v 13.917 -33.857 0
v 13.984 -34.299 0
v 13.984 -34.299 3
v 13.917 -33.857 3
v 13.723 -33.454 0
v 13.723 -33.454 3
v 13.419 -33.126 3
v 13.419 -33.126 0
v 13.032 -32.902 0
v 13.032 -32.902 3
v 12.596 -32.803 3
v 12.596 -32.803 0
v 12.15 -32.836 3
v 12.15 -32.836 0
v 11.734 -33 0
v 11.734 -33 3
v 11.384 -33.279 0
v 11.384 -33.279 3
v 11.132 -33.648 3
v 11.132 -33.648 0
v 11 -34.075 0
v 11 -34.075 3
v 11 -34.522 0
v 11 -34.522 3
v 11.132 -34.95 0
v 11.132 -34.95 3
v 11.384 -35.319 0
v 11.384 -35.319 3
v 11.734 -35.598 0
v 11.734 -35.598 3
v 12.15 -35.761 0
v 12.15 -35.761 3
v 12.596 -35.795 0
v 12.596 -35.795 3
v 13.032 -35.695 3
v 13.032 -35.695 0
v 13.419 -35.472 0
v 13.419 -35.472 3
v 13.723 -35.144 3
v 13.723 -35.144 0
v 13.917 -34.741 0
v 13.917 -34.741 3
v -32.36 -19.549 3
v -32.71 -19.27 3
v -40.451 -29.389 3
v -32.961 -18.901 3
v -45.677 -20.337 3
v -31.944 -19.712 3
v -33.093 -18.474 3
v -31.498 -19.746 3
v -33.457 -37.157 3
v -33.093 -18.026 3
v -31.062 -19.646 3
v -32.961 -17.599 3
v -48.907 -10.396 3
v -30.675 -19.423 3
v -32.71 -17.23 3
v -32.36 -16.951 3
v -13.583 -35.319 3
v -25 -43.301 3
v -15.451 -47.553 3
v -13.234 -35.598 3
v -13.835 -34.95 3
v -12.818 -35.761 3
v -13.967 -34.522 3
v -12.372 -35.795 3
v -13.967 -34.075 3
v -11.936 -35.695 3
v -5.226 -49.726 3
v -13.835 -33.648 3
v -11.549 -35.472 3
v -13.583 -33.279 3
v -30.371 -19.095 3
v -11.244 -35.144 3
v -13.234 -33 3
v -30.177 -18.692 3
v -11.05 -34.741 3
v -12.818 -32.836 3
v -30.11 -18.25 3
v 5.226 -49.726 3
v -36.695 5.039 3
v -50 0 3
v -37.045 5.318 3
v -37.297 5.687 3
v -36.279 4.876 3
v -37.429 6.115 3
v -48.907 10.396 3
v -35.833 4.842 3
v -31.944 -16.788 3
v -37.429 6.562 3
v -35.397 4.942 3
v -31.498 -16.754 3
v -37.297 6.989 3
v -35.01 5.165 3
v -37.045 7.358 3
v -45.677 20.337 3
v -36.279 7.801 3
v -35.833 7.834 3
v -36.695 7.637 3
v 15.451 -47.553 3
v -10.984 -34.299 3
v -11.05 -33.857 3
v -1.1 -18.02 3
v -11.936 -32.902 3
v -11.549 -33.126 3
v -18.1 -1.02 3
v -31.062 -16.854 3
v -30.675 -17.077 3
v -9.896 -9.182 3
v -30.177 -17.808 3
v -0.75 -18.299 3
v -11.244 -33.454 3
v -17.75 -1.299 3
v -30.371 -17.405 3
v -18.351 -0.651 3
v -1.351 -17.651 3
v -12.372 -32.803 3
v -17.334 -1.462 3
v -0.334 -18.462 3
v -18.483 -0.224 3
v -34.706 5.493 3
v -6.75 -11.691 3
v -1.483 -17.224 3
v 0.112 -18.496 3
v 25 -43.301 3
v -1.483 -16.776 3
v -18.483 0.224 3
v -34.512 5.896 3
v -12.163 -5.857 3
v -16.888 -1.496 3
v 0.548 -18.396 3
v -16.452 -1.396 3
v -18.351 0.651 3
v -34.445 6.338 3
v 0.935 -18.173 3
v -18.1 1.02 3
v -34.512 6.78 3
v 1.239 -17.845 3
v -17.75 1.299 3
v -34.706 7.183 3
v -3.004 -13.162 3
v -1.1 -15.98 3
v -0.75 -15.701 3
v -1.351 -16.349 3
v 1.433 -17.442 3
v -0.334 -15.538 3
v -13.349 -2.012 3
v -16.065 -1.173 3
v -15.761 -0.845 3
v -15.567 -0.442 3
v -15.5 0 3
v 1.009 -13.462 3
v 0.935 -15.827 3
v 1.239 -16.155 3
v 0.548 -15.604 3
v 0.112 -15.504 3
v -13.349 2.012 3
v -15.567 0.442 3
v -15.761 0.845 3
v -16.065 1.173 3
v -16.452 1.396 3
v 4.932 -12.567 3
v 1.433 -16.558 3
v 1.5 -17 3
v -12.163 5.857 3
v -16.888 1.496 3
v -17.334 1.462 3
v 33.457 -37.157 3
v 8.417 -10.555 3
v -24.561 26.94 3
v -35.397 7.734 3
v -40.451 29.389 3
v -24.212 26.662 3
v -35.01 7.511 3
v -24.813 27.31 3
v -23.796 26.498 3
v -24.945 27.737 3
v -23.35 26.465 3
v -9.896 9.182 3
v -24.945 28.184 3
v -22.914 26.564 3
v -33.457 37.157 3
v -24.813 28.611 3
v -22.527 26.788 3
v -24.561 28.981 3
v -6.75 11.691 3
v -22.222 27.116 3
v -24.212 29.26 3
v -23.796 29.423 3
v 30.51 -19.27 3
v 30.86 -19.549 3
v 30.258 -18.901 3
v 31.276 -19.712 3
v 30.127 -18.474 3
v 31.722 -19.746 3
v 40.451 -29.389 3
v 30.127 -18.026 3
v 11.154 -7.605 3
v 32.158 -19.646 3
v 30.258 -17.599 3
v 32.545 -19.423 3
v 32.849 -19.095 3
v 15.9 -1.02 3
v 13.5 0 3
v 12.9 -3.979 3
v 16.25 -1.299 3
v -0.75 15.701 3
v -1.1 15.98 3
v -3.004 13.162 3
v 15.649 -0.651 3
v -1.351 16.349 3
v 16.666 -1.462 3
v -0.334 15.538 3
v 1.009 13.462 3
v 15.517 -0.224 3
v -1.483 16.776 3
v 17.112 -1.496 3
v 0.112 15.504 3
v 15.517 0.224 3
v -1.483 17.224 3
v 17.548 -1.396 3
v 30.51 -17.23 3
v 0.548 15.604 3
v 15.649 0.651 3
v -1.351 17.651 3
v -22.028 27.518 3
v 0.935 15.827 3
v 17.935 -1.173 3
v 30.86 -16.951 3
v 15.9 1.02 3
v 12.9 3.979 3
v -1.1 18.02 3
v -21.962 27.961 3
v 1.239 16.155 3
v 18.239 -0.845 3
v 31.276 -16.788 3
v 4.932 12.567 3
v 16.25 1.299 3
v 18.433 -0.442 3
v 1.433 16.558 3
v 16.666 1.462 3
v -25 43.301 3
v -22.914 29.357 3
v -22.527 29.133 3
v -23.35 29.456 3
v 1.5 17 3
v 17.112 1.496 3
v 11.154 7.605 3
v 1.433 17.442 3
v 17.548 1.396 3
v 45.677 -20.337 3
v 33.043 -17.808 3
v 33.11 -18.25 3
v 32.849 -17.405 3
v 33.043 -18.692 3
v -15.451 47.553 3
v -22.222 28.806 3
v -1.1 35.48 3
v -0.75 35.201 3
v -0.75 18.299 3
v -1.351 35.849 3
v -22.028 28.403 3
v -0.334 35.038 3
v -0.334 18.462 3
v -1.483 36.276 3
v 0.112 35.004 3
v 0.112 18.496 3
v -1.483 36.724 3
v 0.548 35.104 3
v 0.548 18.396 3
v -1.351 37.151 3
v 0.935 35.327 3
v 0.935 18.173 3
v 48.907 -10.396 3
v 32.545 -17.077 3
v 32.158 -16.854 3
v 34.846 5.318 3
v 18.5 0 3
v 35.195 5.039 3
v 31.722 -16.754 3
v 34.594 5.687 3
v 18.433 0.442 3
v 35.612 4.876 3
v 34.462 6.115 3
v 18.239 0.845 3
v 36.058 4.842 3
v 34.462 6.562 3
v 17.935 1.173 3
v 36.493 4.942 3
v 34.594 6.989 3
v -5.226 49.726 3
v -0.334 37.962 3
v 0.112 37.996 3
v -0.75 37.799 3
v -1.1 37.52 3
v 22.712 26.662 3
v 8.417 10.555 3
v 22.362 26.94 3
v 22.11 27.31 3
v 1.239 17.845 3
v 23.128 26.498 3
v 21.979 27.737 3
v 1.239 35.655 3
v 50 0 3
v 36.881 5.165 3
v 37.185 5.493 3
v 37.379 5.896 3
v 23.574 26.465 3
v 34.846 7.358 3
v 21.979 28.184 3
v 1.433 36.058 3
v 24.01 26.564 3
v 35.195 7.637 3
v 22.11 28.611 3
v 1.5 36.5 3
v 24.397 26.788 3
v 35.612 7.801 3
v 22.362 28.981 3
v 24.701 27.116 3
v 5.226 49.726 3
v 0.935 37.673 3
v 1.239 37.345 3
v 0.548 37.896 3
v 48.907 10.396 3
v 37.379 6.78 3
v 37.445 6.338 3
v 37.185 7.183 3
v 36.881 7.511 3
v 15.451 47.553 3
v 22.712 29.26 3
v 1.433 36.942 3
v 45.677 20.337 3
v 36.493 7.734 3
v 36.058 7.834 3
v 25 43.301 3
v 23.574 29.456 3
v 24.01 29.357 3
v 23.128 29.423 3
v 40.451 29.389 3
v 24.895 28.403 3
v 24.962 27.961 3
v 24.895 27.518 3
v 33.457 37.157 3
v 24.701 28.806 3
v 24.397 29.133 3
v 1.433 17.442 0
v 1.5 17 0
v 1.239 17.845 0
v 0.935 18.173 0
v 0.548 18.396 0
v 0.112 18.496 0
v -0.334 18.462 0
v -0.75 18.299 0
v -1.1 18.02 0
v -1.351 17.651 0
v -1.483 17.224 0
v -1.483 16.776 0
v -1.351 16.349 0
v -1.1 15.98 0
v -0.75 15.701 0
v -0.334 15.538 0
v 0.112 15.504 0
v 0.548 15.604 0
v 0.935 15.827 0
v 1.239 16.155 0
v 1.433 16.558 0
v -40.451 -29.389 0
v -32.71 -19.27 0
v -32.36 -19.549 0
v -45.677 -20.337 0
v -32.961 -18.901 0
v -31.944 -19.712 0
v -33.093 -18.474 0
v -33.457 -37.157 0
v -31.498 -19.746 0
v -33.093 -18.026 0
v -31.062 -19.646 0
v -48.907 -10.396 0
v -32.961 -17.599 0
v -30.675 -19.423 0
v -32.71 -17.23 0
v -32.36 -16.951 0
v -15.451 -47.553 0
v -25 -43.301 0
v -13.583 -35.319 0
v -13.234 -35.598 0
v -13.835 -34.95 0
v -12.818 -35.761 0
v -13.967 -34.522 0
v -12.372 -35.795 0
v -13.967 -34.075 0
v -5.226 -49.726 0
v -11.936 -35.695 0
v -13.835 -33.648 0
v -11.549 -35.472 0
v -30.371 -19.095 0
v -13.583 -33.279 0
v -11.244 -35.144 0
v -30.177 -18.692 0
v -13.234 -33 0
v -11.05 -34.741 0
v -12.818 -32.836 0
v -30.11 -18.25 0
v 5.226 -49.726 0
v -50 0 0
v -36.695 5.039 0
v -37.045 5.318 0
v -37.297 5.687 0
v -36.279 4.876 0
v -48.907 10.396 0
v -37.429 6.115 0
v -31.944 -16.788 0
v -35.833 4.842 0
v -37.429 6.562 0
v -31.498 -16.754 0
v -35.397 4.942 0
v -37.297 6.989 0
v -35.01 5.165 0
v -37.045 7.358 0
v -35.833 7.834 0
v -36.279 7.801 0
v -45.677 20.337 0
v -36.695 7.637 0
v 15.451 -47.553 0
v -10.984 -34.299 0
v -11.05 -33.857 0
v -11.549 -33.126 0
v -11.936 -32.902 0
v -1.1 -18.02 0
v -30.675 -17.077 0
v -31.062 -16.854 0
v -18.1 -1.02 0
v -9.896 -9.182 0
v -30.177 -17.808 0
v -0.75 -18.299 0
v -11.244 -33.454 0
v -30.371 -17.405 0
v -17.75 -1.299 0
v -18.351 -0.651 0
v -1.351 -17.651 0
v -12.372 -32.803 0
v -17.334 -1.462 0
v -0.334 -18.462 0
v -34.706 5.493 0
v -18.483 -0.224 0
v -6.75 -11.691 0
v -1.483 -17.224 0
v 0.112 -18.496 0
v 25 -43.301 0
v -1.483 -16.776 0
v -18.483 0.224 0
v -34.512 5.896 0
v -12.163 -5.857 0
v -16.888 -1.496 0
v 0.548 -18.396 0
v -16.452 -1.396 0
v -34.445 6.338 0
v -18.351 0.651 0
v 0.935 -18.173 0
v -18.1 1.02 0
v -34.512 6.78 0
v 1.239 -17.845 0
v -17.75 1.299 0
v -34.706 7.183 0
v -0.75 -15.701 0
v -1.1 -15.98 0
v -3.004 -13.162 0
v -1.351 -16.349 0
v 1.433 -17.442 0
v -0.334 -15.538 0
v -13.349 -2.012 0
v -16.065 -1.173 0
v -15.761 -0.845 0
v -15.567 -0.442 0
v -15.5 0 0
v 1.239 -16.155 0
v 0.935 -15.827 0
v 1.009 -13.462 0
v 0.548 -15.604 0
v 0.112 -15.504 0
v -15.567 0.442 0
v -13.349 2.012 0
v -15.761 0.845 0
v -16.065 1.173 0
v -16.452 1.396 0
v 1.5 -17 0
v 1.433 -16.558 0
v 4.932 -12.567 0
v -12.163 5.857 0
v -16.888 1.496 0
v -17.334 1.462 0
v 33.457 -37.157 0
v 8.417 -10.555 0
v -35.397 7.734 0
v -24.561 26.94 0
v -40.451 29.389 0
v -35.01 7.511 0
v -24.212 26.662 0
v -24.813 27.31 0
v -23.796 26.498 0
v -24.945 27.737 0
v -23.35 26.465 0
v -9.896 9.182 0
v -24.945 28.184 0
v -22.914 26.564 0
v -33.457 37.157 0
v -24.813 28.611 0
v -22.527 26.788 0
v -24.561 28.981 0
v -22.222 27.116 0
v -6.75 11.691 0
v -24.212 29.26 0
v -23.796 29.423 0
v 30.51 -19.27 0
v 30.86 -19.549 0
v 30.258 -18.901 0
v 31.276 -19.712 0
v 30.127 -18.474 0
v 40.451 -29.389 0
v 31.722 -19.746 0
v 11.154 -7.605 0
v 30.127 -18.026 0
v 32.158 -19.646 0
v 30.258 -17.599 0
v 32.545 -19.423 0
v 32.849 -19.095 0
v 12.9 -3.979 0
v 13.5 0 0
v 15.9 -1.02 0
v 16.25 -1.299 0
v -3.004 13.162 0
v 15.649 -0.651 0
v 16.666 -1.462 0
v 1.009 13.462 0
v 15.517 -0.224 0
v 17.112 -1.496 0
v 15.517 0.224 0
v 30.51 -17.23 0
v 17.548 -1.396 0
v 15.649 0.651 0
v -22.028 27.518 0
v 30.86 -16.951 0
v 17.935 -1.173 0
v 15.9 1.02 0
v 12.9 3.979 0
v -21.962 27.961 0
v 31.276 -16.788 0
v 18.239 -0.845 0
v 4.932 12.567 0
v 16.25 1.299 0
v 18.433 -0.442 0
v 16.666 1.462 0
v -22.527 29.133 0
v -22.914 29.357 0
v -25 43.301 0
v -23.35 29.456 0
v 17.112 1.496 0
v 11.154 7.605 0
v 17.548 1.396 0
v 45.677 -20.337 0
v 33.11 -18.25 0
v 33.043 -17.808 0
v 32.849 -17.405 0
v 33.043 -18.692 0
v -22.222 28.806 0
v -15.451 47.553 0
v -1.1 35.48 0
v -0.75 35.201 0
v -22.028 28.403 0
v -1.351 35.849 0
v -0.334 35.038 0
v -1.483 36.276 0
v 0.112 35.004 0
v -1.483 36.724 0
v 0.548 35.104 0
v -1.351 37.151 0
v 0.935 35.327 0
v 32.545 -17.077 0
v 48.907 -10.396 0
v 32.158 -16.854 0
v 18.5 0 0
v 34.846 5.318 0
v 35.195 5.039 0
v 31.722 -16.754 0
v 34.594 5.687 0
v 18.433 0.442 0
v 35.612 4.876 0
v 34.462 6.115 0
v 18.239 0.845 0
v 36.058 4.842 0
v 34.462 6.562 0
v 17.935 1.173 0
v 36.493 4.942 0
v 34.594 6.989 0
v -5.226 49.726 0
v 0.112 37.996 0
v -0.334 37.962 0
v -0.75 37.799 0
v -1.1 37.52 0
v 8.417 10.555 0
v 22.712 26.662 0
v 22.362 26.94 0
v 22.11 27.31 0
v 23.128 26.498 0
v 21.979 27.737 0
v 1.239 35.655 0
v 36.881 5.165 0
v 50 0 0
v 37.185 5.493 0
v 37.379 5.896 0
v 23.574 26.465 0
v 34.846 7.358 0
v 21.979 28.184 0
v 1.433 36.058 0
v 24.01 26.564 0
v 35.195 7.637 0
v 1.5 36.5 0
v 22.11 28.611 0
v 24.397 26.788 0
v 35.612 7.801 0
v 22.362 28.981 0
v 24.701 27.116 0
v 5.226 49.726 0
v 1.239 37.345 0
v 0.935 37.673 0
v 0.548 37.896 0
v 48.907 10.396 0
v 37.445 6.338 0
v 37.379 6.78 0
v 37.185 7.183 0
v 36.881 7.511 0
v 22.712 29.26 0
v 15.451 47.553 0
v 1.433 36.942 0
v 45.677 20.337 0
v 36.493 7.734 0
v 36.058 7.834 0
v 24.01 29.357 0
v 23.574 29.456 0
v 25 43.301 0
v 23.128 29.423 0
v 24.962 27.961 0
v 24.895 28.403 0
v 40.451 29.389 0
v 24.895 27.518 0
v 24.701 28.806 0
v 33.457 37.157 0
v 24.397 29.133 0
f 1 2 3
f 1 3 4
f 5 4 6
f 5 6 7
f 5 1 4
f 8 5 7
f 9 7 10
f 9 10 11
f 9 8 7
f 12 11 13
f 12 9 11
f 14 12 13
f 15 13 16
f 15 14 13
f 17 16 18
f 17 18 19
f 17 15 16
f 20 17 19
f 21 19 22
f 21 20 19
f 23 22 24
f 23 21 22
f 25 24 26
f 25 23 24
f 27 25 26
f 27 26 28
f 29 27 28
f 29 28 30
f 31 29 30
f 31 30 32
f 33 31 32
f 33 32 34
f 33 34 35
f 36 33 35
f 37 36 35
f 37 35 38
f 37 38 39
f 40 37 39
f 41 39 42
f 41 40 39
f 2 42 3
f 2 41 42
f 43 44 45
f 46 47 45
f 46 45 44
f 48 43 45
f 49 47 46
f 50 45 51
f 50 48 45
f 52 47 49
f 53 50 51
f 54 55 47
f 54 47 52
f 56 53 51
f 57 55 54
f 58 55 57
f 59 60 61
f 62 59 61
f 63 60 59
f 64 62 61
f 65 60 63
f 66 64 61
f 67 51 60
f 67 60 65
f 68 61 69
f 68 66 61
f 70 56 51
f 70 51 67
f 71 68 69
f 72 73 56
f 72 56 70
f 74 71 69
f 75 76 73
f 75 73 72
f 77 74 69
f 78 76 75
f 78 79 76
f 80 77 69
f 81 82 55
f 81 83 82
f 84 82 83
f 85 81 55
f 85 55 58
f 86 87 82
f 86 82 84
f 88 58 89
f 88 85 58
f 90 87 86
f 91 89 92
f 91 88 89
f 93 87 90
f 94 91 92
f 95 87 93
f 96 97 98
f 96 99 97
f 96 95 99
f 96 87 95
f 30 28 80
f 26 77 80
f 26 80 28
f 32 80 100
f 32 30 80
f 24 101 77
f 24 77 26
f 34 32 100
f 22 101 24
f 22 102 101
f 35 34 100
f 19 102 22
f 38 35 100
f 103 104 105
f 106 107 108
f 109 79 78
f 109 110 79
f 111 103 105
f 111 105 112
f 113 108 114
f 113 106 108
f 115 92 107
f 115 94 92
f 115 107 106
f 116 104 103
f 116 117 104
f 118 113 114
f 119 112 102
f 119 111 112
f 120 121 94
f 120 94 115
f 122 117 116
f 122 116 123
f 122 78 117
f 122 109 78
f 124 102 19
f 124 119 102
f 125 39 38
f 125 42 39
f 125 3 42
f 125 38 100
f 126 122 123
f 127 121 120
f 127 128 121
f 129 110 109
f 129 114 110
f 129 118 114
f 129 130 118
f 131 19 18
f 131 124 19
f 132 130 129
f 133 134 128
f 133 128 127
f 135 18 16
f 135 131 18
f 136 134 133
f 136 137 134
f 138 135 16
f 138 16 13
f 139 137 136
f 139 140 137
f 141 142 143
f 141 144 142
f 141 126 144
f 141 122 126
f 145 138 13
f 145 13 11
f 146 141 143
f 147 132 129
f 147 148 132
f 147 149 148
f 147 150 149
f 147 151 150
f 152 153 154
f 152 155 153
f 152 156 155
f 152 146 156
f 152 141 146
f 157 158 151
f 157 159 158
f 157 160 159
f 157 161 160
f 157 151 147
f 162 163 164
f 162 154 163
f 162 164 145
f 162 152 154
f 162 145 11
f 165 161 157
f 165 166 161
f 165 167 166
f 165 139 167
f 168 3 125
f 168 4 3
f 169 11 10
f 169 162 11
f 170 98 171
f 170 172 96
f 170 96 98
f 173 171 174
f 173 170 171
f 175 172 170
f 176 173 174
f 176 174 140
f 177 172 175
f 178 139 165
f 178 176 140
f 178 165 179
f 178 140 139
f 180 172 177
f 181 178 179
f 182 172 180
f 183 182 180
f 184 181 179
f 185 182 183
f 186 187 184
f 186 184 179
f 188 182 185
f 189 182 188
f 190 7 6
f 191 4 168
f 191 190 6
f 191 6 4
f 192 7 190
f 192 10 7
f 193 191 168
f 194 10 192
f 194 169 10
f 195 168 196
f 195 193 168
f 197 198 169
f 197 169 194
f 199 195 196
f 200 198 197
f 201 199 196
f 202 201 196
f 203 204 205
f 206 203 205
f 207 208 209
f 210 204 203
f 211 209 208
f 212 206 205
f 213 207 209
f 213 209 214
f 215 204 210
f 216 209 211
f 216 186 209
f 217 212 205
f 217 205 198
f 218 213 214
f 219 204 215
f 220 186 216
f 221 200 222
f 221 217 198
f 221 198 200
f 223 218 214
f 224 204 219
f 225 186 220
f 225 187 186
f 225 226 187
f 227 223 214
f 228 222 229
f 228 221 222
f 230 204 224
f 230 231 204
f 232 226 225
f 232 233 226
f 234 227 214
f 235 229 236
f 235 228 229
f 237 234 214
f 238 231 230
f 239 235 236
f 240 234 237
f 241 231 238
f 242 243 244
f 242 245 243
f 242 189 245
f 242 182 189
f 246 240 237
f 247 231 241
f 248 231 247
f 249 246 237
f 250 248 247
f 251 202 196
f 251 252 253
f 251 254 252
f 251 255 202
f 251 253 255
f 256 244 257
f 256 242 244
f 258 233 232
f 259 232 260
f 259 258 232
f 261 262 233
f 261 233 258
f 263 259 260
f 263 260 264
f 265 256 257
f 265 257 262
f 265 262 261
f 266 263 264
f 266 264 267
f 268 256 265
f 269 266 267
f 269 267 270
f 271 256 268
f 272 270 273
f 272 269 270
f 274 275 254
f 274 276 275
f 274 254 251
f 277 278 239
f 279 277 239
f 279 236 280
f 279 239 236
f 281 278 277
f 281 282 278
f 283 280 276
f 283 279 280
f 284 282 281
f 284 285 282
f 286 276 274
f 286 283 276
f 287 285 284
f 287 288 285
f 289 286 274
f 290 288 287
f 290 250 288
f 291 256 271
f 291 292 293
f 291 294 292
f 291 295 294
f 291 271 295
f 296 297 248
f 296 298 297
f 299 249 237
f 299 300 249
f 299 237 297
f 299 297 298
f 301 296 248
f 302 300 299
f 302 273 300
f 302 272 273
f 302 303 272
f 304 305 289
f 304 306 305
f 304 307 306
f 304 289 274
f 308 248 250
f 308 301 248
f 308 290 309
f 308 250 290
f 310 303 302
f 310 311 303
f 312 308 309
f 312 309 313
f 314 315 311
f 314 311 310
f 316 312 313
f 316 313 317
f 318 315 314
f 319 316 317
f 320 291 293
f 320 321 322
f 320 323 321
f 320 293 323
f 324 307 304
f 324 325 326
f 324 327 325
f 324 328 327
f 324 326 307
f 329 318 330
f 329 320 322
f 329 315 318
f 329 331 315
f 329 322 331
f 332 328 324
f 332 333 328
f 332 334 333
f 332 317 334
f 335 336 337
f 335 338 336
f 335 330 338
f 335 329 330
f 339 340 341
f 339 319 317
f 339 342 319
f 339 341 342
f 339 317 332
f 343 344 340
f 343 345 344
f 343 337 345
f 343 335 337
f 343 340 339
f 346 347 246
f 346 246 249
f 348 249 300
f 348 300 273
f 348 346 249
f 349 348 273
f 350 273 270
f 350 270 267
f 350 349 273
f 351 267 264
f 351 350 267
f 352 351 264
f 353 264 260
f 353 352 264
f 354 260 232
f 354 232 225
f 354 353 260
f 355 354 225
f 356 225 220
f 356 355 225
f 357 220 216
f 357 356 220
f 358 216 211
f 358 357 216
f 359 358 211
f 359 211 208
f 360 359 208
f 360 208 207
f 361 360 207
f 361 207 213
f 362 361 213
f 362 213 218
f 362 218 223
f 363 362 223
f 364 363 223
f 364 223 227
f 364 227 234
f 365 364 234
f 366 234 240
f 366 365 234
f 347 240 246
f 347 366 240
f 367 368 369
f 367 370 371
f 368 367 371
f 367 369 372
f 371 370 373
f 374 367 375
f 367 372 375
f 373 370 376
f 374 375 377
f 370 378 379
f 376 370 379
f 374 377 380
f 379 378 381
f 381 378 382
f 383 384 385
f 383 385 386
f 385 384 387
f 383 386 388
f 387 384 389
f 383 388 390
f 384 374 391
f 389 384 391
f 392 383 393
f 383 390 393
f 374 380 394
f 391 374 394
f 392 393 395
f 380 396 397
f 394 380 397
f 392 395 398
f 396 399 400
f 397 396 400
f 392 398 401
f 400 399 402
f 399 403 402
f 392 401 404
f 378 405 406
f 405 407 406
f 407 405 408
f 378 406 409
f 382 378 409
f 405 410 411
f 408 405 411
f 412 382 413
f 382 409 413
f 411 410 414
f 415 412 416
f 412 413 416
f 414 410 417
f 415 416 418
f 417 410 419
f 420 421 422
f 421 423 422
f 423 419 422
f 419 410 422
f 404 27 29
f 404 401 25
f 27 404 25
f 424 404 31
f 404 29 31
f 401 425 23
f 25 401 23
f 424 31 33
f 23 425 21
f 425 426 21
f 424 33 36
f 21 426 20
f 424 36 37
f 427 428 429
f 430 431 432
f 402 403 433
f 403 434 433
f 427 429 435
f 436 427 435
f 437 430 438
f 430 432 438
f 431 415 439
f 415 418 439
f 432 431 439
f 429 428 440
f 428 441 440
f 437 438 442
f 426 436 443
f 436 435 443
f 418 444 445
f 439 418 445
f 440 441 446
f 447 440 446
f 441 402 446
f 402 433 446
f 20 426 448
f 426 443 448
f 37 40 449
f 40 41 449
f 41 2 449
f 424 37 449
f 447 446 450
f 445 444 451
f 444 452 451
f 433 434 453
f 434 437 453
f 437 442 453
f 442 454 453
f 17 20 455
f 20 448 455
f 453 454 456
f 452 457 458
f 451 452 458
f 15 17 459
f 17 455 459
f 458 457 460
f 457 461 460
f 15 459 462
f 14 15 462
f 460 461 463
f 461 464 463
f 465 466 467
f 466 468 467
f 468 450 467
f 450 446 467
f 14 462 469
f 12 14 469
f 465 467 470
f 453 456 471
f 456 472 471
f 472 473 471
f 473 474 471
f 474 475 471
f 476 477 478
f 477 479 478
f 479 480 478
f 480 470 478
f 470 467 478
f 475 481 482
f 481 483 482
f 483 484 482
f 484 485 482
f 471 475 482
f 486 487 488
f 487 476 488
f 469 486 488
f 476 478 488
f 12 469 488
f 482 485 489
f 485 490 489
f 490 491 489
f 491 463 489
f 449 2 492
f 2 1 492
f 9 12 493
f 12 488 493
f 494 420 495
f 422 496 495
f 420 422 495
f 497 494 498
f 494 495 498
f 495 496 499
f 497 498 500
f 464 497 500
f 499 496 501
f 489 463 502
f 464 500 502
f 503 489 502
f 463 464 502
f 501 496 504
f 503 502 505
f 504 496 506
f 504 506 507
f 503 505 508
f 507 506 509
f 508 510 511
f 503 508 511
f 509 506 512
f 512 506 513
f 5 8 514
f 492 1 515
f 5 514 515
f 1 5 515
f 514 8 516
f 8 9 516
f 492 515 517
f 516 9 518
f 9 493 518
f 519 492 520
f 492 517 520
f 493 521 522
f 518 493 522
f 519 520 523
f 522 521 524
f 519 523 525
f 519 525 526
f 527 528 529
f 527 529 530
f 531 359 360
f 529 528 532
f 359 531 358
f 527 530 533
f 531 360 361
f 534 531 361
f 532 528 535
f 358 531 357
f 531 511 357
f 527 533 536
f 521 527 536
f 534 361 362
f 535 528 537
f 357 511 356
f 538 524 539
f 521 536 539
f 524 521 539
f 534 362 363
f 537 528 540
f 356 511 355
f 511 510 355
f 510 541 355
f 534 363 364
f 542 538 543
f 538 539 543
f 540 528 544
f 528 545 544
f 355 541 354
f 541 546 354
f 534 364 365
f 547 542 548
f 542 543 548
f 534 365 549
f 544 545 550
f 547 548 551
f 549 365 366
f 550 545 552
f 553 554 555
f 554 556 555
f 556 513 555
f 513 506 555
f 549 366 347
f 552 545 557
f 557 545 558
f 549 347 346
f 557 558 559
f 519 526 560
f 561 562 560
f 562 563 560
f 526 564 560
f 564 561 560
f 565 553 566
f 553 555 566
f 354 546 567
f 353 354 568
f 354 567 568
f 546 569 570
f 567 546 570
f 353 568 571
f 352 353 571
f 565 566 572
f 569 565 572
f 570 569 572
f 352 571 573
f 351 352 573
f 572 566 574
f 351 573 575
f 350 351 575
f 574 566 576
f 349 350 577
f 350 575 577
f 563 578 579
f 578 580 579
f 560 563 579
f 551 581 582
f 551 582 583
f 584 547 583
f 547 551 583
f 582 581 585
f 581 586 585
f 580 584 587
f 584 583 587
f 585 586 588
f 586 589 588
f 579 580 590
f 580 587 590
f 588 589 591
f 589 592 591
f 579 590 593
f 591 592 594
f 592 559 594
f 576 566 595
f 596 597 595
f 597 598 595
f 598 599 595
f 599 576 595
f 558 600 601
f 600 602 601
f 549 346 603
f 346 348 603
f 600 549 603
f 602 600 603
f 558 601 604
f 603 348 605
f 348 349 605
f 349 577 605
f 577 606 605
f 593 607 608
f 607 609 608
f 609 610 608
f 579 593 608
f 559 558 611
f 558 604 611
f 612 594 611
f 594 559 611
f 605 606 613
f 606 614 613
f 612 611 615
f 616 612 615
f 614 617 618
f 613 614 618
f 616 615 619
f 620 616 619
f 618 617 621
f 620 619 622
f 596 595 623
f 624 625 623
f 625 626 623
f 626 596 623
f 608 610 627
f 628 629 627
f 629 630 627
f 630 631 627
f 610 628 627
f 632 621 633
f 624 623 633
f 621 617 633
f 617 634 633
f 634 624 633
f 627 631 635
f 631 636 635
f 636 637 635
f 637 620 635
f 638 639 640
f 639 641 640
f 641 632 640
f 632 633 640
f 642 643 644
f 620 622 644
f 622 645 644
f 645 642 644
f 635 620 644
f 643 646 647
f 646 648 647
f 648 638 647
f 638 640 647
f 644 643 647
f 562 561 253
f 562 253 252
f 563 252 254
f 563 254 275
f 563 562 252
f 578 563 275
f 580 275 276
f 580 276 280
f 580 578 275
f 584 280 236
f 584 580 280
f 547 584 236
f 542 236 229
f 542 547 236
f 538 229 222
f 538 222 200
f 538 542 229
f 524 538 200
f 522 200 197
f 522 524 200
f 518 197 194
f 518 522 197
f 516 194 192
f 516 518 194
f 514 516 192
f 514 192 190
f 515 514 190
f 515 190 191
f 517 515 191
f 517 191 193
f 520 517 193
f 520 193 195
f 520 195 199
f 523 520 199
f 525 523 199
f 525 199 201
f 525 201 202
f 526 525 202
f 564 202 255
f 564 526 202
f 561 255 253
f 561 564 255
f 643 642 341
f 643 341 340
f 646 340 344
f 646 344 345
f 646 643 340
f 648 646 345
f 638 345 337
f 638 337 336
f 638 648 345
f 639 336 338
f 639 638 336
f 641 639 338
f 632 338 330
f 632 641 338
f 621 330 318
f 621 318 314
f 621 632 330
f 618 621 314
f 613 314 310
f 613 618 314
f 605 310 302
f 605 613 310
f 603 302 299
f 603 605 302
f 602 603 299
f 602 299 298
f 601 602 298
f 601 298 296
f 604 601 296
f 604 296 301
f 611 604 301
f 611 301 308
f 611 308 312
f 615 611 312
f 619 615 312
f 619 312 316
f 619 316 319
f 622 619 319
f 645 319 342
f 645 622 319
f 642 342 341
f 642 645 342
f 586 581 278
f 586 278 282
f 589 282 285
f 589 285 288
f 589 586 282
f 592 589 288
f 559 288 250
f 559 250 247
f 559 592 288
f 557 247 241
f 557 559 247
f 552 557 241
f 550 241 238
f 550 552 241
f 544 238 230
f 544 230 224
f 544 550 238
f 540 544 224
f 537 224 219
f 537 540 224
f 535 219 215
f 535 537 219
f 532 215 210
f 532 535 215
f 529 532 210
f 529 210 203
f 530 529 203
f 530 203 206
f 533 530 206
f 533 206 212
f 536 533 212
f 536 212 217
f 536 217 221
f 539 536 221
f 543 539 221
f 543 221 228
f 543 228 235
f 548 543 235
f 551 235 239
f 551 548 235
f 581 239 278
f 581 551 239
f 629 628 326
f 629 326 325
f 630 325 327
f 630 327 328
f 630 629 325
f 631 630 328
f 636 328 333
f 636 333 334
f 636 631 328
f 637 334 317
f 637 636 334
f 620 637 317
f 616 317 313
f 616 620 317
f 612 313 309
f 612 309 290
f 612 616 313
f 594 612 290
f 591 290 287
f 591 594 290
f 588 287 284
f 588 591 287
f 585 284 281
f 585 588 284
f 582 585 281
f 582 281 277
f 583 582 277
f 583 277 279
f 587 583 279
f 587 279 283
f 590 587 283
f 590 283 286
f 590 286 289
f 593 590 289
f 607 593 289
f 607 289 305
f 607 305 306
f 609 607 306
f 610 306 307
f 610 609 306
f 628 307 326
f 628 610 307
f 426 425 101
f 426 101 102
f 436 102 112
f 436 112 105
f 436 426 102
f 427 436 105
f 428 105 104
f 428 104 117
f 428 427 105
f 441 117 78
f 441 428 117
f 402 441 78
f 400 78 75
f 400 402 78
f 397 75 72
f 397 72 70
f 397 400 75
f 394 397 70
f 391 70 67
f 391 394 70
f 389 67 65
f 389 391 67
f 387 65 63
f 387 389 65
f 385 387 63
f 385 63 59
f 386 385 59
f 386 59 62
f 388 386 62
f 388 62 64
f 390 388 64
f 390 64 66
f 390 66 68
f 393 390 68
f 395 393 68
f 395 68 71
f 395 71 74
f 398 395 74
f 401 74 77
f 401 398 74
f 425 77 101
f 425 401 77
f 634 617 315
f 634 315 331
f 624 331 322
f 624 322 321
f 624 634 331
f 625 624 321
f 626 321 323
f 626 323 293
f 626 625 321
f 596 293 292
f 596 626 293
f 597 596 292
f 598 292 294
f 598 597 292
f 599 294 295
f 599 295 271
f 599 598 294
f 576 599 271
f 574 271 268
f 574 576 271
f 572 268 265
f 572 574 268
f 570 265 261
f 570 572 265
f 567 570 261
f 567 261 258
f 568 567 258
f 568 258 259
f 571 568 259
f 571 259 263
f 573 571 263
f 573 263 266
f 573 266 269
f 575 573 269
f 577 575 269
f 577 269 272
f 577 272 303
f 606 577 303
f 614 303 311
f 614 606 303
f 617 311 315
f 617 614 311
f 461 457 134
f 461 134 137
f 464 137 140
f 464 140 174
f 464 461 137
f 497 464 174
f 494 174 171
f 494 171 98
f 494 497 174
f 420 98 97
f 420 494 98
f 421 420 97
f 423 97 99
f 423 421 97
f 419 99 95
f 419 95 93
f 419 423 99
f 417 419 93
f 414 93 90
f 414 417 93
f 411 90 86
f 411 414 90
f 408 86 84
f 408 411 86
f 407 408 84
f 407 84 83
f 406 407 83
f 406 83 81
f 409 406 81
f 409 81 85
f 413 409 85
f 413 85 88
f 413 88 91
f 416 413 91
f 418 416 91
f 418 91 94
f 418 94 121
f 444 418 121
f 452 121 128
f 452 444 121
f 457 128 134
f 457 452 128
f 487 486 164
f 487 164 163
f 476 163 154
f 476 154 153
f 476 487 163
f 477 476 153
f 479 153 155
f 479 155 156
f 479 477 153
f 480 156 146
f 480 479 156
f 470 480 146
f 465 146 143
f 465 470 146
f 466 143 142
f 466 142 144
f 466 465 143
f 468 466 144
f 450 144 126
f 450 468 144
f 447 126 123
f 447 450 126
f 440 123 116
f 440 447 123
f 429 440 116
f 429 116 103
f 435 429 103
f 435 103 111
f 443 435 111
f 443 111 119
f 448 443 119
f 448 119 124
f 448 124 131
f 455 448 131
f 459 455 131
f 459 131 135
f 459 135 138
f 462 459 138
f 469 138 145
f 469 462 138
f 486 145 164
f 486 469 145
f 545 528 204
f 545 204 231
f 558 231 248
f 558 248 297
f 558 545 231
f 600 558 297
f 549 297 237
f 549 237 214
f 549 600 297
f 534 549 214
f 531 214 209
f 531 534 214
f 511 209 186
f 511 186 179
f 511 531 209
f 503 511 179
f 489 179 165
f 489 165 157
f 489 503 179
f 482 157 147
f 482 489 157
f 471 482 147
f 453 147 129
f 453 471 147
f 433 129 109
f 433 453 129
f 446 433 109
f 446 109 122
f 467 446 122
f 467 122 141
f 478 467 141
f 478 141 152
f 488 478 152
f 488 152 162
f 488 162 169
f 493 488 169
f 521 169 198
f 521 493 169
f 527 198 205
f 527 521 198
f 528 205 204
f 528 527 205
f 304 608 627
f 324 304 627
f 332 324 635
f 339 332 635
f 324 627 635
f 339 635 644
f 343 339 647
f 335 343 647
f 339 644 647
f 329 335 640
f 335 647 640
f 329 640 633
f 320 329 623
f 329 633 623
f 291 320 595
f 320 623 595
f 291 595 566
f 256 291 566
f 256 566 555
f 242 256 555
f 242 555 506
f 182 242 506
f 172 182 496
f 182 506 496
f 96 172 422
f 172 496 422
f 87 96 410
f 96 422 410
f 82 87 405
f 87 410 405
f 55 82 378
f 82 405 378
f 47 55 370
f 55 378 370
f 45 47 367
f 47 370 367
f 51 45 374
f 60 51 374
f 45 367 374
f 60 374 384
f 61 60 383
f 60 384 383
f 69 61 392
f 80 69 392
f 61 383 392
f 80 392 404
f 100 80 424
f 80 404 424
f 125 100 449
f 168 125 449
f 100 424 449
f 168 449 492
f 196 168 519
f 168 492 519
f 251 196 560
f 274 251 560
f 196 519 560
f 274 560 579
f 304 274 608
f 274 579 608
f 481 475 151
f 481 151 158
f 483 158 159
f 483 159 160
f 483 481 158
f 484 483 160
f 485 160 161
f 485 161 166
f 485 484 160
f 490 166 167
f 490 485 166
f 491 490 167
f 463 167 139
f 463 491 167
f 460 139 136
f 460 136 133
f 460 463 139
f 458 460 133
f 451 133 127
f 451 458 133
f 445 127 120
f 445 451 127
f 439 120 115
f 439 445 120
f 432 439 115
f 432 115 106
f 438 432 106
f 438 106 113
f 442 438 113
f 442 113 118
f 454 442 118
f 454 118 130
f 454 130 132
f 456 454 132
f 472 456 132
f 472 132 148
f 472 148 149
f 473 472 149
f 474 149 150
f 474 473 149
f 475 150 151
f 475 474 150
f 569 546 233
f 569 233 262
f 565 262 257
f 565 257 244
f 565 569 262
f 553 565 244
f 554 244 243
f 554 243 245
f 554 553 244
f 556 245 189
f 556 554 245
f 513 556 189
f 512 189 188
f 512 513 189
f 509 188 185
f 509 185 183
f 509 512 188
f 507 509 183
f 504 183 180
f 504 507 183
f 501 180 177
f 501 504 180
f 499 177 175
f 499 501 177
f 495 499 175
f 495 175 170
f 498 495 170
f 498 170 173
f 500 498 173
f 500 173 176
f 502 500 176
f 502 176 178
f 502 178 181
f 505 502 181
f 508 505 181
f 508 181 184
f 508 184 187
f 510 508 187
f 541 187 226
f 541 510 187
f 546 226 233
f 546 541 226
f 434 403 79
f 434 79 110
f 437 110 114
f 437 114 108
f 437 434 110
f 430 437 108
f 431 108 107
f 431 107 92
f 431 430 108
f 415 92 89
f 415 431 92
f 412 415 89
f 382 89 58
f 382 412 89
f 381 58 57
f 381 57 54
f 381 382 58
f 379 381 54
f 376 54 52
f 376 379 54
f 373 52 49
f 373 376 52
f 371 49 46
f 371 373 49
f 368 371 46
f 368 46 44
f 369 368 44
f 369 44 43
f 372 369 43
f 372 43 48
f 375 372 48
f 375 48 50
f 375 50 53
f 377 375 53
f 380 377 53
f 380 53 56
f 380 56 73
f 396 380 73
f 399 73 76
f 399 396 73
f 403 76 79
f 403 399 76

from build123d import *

# Parameters (mm, degrees)
SKETCH_1_R      = 50
SKETCH_1_R_2    = 1.5
SKETCH_1_R_3    = 13.5
EXTRUDE_1_DEPTH = 3


with BuildPart() as part:
    # 草图1 → 凸台-拉伸1 (new body)
    with BuildSketch(Plane.XY):
        Circle(SKETCH_1_R)
        with Locations((0, 17)):
            Circle(SKETCH_1_R_2, mode=Mode.SUBTRACT)
        with Locations((17, 0)):
            Circle(SKETCH_1_R_2, mode=Mode.SUBTRACT)
        with Locations((0, -17)):
            Circle(SKETCH_1_R_2, mode=Mode.SUBTRACT)
        with Locations((-17, 0)):
            Circle(SKETCH_1_R_2, mode=Mode.SUBTRACT)
        with Locations((-23.461747754, 27.960622174)):
            Circle(SKETCH_1_R_2, mode=Mode.SUBTRACT)
        with Locations((0, 36.5)):
            Circle(SKETCH_1_R_2, mode=Mode.SUBTRACT)
        with Locations((23.461747754, 27.960622174)):
            Circle(SKETCH_1_R_2, mode=Mode.SUBTRACT)
        with Locations((35.945482985, 6.338158485)):
            Circle(SKETCH_1_R_2, mode=Mode.SUBTRACT)
        with Locations((31.609927238, -18.25)):
            Circle(SKETCH_1_R_2, mode=Mode.SUBTRACT)
        with Locations((12.483735231, -34.298780659)):
            Circle(SKETCH_1_R_2, mode=Mode.SUBTRACT)
        with Locations((-12.483735231, -34.298780659)):
            Circle(SKETCH_1_R_2, mode=Mode.SUBTRACT)
        with Locations((-31.609927238, -18.25)):
            Circle(SKETCH_1_R_2, mode=Mode.SUBTRACT)
        with Locations((-35.945482985, 6.338158485)):
            Circle(SKETCH_1_R_2, mode=Mode.SUBTRACT)
        Circle(SKETCH_1_R_3, mode=Mode.SUBTRACT)
    extrude(amount=EXTRUDE_1_DEPTH)


solid = part.part
